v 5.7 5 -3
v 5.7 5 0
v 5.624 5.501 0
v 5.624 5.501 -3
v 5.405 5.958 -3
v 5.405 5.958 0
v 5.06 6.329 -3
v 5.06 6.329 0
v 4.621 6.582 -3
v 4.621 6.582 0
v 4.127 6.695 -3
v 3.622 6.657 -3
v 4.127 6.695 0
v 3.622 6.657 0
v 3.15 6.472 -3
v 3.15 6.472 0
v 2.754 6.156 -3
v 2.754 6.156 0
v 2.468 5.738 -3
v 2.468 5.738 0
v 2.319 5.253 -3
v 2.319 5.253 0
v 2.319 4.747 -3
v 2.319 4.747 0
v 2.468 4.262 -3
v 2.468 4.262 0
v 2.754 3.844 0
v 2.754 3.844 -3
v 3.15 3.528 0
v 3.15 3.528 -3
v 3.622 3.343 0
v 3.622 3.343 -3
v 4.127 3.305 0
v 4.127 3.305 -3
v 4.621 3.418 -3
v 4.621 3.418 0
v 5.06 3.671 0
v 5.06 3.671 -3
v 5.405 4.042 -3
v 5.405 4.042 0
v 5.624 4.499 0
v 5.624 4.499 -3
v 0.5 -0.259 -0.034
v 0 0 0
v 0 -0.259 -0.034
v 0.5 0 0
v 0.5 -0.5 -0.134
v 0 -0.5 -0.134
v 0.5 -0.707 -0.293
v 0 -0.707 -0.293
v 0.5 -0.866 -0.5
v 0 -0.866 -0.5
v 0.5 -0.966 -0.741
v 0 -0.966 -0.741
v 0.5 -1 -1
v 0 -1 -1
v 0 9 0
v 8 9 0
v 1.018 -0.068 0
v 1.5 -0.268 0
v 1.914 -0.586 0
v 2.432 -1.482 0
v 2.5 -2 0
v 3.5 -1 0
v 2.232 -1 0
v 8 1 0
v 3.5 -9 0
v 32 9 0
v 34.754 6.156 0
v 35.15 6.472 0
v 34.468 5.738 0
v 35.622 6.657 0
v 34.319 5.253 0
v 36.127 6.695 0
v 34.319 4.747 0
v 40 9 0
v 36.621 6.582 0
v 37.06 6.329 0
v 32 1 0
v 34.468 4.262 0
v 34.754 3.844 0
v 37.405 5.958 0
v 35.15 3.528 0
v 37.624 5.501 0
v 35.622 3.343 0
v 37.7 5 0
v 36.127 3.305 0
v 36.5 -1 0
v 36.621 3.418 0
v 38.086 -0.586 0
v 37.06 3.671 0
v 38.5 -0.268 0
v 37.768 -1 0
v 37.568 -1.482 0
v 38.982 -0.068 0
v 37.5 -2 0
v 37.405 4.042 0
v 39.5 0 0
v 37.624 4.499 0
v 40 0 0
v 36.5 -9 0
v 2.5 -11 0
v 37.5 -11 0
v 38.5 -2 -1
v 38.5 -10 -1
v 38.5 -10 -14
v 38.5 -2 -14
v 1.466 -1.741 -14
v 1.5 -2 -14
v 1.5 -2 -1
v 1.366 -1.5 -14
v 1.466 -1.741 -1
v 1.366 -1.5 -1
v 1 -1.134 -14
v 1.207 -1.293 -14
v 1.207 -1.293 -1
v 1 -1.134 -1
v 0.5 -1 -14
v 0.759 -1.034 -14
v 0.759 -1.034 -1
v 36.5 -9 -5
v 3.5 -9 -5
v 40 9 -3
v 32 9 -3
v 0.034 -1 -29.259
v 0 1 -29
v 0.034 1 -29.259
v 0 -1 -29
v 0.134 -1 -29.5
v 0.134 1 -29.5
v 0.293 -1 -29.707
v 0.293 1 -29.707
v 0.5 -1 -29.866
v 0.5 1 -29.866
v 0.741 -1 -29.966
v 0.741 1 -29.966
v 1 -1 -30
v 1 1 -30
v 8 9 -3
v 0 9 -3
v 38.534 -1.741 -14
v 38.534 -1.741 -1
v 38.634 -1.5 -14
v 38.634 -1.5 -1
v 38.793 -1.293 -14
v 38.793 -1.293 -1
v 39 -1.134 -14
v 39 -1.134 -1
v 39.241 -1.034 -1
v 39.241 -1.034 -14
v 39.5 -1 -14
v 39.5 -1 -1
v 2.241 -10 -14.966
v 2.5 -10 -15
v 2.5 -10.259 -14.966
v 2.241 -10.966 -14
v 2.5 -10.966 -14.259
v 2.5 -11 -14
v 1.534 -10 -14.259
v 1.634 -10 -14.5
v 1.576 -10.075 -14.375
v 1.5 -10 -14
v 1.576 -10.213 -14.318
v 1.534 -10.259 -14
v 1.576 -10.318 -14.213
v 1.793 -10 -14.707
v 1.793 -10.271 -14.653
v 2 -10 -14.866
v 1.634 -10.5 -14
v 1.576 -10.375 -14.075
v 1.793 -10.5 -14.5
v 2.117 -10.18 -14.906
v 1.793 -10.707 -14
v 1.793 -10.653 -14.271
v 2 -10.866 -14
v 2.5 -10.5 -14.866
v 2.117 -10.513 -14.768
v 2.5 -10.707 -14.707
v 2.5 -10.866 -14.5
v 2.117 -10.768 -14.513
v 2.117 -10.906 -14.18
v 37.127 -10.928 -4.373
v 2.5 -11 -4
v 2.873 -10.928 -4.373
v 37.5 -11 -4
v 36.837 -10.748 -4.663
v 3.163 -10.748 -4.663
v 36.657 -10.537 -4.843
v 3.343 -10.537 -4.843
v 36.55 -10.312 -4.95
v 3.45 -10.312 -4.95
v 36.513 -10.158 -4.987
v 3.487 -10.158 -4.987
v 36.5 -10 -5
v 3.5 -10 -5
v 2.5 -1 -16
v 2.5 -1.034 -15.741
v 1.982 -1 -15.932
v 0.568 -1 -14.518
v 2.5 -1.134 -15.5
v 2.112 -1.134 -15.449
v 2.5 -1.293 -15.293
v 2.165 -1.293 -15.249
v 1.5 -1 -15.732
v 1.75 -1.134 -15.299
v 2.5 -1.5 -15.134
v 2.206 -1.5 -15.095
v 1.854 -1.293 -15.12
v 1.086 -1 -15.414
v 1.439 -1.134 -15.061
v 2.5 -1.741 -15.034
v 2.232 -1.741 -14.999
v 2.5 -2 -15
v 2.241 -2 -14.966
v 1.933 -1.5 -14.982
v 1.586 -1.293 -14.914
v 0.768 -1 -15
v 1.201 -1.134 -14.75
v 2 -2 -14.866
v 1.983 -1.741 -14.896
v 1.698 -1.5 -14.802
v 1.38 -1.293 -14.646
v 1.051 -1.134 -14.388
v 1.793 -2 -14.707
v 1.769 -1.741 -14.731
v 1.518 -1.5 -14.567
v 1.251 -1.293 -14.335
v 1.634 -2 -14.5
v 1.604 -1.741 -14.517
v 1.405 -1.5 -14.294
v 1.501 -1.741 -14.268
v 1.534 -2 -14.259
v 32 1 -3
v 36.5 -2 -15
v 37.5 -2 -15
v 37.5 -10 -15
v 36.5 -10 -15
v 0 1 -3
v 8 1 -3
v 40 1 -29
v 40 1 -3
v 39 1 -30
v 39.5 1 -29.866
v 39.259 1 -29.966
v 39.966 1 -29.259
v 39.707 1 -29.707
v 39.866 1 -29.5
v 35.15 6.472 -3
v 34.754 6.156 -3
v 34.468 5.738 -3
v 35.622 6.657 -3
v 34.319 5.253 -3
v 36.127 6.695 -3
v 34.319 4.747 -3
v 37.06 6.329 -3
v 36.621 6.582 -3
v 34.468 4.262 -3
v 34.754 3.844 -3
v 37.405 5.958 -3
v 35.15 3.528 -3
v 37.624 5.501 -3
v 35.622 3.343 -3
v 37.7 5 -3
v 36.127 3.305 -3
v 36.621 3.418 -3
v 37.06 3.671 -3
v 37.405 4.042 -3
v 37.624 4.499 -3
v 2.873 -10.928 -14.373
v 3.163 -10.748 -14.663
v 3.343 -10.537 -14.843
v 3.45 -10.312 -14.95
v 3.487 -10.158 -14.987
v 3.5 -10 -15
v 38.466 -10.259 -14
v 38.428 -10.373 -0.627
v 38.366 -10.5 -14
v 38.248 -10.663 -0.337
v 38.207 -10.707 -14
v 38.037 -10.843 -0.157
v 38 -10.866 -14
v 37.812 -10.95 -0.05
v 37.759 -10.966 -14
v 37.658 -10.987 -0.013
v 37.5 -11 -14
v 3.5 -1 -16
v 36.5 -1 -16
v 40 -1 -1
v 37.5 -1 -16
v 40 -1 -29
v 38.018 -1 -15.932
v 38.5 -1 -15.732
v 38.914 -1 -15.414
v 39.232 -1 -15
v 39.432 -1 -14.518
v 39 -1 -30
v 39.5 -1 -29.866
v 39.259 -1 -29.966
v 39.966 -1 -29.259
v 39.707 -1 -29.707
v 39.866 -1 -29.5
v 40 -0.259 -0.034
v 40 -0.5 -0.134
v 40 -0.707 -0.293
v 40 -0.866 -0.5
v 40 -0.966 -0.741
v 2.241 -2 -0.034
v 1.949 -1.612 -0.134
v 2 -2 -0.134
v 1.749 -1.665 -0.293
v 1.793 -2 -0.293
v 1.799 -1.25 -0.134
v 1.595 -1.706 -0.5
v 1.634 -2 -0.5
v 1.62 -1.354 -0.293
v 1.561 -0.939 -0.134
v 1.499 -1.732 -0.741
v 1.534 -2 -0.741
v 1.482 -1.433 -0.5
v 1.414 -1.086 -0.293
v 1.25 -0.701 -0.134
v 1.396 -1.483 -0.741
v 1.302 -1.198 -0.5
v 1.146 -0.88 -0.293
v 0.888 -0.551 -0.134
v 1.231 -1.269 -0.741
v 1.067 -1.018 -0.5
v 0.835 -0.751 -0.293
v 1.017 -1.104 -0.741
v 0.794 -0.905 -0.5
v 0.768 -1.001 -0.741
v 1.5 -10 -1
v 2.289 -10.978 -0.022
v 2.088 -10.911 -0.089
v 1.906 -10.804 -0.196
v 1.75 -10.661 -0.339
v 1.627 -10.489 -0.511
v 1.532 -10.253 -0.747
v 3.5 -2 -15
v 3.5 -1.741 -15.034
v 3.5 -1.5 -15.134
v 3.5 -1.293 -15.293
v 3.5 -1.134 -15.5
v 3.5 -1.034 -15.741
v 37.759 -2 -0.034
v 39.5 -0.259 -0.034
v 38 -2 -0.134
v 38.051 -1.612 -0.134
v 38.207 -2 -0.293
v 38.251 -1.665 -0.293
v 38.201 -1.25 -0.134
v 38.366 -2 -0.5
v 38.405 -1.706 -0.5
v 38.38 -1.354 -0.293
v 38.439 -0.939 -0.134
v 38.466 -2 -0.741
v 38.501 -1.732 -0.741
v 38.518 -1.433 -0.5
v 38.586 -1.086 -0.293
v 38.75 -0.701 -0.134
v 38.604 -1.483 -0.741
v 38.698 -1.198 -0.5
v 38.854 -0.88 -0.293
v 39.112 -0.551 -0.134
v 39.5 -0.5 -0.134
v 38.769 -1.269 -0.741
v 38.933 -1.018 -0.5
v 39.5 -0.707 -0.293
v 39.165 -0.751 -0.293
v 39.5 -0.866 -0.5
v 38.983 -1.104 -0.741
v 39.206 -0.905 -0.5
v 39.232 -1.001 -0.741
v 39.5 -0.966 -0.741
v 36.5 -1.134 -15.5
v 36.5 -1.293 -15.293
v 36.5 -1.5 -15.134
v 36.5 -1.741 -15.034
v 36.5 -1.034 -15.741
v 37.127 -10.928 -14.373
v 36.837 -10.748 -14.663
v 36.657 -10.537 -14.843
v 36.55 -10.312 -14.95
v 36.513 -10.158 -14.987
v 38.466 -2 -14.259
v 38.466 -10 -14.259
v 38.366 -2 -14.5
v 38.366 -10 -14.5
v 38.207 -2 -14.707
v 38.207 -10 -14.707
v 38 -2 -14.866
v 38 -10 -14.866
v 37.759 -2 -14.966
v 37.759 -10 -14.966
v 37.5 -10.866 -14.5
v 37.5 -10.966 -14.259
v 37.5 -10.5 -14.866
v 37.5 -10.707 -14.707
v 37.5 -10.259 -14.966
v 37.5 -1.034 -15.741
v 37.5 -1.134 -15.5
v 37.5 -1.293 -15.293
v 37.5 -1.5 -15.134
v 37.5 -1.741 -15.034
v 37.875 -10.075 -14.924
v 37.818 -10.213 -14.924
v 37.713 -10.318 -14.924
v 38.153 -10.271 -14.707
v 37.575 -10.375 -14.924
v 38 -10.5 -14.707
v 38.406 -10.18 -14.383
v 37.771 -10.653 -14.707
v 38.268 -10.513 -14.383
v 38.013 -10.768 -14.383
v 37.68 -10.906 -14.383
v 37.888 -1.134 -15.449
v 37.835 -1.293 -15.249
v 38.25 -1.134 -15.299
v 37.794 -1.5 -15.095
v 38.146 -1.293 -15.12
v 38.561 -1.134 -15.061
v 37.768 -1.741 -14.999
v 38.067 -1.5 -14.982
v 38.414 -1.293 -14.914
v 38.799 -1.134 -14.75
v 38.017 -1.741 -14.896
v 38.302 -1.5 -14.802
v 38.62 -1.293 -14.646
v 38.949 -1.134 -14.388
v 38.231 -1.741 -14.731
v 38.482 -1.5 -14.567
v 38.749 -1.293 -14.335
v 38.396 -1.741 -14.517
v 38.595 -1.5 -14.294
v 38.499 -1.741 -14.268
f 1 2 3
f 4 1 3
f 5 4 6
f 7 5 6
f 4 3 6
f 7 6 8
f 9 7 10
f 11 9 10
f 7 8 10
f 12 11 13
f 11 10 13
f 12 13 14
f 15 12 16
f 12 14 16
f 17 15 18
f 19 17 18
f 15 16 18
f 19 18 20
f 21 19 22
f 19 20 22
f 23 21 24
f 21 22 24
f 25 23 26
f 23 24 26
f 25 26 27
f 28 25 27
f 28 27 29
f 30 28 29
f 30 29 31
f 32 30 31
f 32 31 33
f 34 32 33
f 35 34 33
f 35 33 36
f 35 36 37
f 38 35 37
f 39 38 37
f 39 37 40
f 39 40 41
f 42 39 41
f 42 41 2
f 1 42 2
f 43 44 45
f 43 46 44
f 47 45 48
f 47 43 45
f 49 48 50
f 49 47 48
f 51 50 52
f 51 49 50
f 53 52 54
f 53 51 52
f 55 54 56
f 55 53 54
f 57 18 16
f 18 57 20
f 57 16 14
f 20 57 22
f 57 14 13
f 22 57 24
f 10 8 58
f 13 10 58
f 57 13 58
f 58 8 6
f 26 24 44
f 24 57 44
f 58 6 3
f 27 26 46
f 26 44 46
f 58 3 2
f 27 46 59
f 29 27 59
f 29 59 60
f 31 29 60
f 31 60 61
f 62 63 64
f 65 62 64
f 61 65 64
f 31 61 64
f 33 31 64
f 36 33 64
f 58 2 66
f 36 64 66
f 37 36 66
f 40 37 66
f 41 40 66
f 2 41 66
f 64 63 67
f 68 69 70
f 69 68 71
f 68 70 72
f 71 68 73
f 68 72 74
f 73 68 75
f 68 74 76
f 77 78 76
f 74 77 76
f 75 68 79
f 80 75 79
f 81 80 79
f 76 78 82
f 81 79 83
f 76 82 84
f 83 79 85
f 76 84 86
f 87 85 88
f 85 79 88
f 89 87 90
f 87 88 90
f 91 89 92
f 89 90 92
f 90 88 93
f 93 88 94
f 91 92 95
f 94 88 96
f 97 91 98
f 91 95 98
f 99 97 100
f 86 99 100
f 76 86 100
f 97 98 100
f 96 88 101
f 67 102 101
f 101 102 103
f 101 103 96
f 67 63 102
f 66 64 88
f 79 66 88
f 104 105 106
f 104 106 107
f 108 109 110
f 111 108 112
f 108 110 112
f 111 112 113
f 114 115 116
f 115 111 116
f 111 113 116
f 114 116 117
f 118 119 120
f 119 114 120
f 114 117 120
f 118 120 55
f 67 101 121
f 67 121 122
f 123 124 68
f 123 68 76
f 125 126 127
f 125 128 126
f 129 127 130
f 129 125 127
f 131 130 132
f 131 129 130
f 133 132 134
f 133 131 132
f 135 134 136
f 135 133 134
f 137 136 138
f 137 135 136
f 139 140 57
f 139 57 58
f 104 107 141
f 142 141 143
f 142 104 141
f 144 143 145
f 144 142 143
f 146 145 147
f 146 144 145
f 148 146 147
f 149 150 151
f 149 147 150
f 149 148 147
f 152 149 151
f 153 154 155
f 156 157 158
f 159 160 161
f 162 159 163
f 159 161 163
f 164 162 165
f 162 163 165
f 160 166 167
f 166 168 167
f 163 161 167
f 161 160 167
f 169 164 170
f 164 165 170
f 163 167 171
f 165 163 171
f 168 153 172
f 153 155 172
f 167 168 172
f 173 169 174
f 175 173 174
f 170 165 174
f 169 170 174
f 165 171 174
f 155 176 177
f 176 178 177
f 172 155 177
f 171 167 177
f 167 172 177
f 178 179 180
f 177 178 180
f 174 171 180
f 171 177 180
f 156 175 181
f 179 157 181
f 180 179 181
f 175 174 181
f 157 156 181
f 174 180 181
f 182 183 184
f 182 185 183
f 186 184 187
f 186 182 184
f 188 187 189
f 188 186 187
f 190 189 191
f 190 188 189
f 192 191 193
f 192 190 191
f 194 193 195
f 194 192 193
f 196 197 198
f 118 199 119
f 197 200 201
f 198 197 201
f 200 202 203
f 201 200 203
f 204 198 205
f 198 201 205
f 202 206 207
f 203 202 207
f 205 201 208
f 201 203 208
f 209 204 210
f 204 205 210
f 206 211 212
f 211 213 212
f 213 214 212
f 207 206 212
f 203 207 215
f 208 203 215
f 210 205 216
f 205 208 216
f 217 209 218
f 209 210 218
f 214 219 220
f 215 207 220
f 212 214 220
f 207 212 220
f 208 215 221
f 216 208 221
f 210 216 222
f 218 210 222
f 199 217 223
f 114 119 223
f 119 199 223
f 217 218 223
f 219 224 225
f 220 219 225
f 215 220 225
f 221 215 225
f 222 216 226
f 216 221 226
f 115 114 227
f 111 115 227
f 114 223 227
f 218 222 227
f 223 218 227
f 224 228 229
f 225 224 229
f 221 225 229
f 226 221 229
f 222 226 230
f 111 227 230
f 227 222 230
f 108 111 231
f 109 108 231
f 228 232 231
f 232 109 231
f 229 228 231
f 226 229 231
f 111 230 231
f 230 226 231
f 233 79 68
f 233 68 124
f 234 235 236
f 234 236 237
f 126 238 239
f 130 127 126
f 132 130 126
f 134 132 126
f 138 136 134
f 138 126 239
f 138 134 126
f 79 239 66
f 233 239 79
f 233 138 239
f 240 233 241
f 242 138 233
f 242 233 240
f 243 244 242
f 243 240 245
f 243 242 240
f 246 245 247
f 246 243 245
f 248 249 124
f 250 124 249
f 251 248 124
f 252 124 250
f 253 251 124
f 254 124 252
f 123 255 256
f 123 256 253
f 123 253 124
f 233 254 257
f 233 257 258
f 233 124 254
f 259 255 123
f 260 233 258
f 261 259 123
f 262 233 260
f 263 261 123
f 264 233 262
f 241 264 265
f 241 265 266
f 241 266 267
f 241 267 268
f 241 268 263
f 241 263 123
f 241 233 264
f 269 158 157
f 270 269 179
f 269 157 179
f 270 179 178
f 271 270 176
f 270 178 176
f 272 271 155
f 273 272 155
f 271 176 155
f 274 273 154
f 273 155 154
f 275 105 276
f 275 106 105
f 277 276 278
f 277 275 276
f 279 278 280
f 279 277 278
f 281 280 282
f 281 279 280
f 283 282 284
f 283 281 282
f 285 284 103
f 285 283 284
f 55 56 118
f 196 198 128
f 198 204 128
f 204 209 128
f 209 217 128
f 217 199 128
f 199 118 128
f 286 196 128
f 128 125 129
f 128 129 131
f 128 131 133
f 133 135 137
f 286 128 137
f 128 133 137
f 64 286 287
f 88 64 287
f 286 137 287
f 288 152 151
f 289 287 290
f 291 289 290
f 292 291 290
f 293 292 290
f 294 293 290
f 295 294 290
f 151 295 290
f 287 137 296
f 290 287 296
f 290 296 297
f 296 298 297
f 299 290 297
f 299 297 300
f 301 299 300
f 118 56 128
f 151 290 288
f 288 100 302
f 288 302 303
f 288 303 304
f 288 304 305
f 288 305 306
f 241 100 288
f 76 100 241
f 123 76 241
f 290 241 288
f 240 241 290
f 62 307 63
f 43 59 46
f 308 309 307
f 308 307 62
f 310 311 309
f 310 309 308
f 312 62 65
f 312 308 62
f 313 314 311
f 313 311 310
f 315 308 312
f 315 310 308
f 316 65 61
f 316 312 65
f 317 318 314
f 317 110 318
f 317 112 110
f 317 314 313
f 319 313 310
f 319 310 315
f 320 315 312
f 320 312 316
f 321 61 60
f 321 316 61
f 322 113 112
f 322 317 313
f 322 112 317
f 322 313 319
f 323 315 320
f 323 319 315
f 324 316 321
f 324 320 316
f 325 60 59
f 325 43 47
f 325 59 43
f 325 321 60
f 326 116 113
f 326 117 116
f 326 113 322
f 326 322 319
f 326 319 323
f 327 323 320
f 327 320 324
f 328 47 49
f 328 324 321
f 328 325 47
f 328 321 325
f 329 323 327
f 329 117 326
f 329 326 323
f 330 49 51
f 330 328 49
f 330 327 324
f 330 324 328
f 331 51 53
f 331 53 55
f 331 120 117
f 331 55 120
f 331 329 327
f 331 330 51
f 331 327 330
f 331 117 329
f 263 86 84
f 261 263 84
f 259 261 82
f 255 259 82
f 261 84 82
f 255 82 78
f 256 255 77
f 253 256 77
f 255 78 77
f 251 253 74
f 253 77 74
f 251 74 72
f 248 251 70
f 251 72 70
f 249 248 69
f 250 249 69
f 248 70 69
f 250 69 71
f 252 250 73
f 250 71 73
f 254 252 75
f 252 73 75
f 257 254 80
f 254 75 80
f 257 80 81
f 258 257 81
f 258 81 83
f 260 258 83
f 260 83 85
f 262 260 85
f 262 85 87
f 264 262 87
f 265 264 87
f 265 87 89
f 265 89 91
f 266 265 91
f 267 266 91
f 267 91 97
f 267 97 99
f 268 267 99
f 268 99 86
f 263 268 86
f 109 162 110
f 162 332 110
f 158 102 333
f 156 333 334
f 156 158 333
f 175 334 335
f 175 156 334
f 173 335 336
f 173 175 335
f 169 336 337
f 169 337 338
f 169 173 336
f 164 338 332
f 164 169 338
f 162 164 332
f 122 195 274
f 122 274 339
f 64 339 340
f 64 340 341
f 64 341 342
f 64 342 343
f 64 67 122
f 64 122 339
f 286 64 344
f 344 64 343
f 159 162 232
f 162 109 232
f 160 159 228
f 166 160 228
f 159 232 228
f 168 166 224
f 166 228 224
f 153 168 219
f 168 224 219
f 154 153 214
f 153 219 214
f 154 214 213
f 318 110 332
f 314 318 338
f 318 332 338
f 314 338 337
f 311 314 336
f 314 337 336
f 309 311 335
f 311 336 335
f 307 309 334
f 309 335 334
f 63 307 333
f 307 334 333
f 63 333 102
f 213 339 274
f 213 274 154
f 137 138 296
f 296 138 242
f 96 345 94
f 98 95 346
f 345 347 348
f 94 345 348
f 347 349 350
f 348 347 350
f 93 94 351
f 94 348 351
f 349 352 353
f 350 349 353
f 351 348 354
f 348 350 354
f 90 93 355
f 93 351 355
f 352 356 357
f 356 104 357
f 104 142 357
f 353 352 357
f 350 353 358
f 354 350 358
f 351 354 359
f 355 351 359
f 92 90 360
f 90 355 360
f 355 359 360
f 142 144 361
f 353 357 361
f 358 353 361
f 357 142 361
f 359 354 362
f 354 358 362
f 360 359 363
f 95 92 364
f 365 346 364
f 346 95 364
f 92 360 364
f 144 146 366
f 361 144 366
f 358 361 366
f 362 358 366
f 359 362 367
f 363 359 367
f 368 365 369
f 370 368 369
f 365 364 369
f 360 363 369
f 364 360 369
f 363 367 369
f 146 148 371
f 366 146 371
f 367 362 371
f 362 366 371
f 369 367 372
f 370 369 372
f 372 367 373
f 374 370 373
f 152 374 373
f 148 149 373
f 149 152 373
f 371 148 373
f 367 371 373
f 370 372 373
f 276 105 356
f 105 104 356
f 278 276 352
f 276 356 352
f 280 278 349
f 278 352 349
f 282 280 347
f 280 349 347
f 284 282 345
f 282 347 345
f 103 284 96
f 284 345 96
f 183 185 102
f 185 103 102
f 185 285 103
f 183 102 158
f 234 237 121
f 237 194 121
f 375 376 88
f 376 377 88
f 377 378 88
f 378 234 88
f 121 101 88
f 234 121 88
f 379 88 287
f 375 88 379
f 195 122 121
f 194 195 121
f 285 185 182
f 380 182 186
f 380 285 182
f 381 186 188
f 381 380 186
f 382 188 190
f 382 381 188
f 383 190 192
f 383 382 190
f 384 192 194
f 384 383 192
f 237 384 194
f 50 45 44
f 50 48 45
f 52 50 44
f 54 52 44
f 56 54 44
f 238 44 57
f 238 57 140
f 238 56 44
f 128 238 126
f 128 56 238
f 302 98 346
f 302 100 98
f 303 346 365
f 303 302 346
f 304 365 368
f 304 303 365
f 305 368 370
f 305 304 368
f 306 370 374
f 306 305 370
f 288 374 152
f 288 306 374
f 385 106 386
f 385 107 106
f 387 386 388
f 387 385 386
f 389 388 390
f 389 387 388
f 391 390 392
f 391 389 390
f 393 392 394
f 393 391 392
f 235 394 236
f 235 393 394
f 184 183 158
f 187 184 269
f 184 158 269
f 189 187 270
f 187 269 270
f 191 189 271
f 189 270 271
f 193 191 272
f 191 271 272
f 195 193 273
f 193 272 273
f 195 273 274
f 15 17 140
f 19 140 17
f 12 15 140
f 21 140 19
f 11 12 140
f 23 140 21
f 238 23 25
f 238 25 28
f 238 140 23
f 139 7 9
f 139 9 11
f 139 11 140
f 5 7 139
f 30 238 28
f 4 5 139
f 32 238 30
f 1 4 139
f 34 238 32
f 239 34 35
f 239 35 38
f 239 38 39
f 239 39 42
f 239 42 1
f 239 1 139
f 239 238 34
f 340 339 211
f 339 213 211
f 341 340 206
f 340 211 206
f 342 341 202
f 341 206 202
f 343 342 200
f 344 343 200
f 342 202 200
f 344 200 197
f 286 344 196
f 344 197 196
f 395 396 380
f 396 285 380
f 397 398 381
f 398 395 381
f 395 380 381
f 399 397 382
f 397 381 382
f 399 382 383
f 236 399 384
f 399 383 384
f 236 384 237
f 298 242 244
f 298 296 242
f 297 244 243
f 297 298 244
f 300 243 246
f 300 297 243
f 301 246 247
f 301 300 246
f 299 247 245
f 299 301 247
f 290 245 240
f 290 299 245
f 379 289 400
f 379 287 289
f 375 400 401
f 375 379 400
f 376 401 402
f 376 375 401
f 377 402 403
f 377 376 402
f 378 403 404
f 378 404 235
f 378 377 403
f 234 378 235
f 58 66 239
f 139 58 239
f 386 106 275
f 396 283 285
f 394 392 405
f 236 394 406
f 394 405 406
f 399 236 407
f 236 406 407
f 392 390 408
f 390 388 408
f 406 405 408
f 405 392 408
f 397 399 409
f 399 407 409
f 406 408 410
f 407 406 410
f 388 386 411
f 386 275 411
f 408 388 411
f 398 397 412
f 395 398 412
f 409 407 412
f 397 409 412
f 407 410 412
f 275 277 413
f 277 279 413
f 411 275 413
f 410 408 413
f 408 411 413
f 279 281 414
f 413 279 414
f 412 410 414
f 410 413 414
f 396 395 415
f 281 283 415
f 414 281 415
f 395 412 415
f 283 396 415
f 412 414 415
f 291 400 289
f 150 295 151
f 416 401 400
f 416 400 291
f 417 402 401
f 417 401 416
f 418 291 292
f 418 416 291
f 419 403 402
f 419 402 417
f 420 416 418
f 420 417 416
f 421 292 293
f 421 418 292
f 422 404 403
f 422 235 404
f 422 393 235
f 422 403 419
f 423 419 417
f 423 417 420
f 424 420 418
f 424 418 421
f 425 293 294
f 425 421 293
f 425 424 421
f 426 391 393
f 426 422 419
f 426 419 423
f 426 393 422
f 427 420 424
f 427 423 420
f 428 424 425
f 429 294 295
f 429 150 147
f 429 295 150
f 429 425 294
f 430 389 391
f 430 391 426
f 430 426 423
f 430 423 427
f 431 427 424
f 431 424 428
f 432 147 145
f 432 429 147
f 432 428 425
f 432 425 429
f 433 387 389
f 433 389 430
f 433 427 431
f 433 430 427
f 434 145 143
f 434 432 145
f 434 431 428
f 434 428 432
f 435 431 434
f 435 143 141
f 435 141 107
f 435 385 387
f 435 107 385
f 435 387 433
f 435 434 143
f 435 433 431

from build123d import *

# Parameters (mm, degrees)
SKETCH1_W            = 40
SKETCH1_H            = 30
BOSS_EXTRUDE1_DEPTH  = 1
SKETCH2_W            = 8
SKETCH2_H            = 3
BOSS_EXTRUDE2_DEPTH  = 8
M3_CLEARANCE_HOLE1_D = 3.4
BOSS_EXTRUDE3_DEPTH  = 5
SKETCH8_W            = 2
SKETCH8_H            = 10
BOSS_EXTRUDE4_DEPTH  = 10
FILLET1_R            = 1


with BuildPart() as part:
    # Sketch1 → Boss-Extrude1 (new, symmetric)
    with BuildSketch(Plane(origin=(0, 0, 0), x_dir=(1, 0, 0), z_dir=(0, 1, 0))):
        with Locations((20, 15)):
            Rectangle(SKETCH1_W, SKETCH1_H)
    extrude(amount=BOSS_EXTRUDE1_DEPTH, both=True)

    # Sketch2 → Boss-Extrude2 (add)
    with BuildSketch(Plane(origin=(0, 1, 0), x_dir=(1, 0, 0), z_dir=(0, 1, 0))):
        with Locations((4, 1.5)):
            Rectangle(SKETCH2_W, SKETCH2_H)
        with Locations((36, 1.5)):
            Rectangle(SKETCH2_W, SKETCH2_H)
    extrude(amount=BOSS_EXTRUDE2_DEPTH)

    # M3 Clearance Hole1 (through all)
    with Locations(Plane(origin=(0, 0, -3), x_dir=(-1, 0, 0), z_dir=(0, 0, -1))):
        with Locations((-4, 5), (-36, 5)):
            Hole(M3_CLEARANCE_HOLE1_D / 2)

    # Sketch7 → Boss-Extrude3 (add)
    with BuildSketch(Plane.XY):
        Polygon((1.5, -1), (1.5, -11), (38.5, -11), (38.5, -1), (36.5, -1), (36.5, -9), (3.5, -9), (3.5, -1), align=None)
    extrude(amount=-BOSS_EXTRUDE3_DEPTH)

    # Sketch8 → Boss-Extrude4 (add)
    with BuildSketch(Plane(origin=(0, 0, -5), x_dir=(-1, 0, 0), z_dir=(0, 0, -1))):
        with Locations((-37.5, -6)):
            Rectangle(SKETCH8_W, SKETCH8_H)
        with Locations((-2.5, -6)):
            Rectangle(SKETCH8_W, SKETCH8_H)
    extrude(amount=BOSS_EXTRUDE4_DEPTH)

    # Fillet1
    fillet1_edges = [part.edges().sort_by_distance(p)[0] for p in [
        (3.5, -11, -10),
        (2.5, -11, -15),
        (1.5, -6, -15),
        (2.5, -1, -15),
        (0.75, -1, 0),
        (39.25, -1, 0),
        (38.5, -1, -7.5),
        (38.5, -11, -7.5),
        (1.5, -11, -7.5),
        (1.5, -1, -7.5),
        (1.5, -6, 0),
        (38.5, -6, 0),
        (40, 0, -30),
        (0, 0, -30),
        (36.5, -11, -10),
        (38.5, -6, -15),
        (37.5, -11, -15),
        (37.5, -1, -15),
        (20, -11, -5),
    ]]
    fillet(fillet1_edges, radius=FILLET1_R - 0.0001)  # a hair under: the kernel refuses the full size


solid = part.part
